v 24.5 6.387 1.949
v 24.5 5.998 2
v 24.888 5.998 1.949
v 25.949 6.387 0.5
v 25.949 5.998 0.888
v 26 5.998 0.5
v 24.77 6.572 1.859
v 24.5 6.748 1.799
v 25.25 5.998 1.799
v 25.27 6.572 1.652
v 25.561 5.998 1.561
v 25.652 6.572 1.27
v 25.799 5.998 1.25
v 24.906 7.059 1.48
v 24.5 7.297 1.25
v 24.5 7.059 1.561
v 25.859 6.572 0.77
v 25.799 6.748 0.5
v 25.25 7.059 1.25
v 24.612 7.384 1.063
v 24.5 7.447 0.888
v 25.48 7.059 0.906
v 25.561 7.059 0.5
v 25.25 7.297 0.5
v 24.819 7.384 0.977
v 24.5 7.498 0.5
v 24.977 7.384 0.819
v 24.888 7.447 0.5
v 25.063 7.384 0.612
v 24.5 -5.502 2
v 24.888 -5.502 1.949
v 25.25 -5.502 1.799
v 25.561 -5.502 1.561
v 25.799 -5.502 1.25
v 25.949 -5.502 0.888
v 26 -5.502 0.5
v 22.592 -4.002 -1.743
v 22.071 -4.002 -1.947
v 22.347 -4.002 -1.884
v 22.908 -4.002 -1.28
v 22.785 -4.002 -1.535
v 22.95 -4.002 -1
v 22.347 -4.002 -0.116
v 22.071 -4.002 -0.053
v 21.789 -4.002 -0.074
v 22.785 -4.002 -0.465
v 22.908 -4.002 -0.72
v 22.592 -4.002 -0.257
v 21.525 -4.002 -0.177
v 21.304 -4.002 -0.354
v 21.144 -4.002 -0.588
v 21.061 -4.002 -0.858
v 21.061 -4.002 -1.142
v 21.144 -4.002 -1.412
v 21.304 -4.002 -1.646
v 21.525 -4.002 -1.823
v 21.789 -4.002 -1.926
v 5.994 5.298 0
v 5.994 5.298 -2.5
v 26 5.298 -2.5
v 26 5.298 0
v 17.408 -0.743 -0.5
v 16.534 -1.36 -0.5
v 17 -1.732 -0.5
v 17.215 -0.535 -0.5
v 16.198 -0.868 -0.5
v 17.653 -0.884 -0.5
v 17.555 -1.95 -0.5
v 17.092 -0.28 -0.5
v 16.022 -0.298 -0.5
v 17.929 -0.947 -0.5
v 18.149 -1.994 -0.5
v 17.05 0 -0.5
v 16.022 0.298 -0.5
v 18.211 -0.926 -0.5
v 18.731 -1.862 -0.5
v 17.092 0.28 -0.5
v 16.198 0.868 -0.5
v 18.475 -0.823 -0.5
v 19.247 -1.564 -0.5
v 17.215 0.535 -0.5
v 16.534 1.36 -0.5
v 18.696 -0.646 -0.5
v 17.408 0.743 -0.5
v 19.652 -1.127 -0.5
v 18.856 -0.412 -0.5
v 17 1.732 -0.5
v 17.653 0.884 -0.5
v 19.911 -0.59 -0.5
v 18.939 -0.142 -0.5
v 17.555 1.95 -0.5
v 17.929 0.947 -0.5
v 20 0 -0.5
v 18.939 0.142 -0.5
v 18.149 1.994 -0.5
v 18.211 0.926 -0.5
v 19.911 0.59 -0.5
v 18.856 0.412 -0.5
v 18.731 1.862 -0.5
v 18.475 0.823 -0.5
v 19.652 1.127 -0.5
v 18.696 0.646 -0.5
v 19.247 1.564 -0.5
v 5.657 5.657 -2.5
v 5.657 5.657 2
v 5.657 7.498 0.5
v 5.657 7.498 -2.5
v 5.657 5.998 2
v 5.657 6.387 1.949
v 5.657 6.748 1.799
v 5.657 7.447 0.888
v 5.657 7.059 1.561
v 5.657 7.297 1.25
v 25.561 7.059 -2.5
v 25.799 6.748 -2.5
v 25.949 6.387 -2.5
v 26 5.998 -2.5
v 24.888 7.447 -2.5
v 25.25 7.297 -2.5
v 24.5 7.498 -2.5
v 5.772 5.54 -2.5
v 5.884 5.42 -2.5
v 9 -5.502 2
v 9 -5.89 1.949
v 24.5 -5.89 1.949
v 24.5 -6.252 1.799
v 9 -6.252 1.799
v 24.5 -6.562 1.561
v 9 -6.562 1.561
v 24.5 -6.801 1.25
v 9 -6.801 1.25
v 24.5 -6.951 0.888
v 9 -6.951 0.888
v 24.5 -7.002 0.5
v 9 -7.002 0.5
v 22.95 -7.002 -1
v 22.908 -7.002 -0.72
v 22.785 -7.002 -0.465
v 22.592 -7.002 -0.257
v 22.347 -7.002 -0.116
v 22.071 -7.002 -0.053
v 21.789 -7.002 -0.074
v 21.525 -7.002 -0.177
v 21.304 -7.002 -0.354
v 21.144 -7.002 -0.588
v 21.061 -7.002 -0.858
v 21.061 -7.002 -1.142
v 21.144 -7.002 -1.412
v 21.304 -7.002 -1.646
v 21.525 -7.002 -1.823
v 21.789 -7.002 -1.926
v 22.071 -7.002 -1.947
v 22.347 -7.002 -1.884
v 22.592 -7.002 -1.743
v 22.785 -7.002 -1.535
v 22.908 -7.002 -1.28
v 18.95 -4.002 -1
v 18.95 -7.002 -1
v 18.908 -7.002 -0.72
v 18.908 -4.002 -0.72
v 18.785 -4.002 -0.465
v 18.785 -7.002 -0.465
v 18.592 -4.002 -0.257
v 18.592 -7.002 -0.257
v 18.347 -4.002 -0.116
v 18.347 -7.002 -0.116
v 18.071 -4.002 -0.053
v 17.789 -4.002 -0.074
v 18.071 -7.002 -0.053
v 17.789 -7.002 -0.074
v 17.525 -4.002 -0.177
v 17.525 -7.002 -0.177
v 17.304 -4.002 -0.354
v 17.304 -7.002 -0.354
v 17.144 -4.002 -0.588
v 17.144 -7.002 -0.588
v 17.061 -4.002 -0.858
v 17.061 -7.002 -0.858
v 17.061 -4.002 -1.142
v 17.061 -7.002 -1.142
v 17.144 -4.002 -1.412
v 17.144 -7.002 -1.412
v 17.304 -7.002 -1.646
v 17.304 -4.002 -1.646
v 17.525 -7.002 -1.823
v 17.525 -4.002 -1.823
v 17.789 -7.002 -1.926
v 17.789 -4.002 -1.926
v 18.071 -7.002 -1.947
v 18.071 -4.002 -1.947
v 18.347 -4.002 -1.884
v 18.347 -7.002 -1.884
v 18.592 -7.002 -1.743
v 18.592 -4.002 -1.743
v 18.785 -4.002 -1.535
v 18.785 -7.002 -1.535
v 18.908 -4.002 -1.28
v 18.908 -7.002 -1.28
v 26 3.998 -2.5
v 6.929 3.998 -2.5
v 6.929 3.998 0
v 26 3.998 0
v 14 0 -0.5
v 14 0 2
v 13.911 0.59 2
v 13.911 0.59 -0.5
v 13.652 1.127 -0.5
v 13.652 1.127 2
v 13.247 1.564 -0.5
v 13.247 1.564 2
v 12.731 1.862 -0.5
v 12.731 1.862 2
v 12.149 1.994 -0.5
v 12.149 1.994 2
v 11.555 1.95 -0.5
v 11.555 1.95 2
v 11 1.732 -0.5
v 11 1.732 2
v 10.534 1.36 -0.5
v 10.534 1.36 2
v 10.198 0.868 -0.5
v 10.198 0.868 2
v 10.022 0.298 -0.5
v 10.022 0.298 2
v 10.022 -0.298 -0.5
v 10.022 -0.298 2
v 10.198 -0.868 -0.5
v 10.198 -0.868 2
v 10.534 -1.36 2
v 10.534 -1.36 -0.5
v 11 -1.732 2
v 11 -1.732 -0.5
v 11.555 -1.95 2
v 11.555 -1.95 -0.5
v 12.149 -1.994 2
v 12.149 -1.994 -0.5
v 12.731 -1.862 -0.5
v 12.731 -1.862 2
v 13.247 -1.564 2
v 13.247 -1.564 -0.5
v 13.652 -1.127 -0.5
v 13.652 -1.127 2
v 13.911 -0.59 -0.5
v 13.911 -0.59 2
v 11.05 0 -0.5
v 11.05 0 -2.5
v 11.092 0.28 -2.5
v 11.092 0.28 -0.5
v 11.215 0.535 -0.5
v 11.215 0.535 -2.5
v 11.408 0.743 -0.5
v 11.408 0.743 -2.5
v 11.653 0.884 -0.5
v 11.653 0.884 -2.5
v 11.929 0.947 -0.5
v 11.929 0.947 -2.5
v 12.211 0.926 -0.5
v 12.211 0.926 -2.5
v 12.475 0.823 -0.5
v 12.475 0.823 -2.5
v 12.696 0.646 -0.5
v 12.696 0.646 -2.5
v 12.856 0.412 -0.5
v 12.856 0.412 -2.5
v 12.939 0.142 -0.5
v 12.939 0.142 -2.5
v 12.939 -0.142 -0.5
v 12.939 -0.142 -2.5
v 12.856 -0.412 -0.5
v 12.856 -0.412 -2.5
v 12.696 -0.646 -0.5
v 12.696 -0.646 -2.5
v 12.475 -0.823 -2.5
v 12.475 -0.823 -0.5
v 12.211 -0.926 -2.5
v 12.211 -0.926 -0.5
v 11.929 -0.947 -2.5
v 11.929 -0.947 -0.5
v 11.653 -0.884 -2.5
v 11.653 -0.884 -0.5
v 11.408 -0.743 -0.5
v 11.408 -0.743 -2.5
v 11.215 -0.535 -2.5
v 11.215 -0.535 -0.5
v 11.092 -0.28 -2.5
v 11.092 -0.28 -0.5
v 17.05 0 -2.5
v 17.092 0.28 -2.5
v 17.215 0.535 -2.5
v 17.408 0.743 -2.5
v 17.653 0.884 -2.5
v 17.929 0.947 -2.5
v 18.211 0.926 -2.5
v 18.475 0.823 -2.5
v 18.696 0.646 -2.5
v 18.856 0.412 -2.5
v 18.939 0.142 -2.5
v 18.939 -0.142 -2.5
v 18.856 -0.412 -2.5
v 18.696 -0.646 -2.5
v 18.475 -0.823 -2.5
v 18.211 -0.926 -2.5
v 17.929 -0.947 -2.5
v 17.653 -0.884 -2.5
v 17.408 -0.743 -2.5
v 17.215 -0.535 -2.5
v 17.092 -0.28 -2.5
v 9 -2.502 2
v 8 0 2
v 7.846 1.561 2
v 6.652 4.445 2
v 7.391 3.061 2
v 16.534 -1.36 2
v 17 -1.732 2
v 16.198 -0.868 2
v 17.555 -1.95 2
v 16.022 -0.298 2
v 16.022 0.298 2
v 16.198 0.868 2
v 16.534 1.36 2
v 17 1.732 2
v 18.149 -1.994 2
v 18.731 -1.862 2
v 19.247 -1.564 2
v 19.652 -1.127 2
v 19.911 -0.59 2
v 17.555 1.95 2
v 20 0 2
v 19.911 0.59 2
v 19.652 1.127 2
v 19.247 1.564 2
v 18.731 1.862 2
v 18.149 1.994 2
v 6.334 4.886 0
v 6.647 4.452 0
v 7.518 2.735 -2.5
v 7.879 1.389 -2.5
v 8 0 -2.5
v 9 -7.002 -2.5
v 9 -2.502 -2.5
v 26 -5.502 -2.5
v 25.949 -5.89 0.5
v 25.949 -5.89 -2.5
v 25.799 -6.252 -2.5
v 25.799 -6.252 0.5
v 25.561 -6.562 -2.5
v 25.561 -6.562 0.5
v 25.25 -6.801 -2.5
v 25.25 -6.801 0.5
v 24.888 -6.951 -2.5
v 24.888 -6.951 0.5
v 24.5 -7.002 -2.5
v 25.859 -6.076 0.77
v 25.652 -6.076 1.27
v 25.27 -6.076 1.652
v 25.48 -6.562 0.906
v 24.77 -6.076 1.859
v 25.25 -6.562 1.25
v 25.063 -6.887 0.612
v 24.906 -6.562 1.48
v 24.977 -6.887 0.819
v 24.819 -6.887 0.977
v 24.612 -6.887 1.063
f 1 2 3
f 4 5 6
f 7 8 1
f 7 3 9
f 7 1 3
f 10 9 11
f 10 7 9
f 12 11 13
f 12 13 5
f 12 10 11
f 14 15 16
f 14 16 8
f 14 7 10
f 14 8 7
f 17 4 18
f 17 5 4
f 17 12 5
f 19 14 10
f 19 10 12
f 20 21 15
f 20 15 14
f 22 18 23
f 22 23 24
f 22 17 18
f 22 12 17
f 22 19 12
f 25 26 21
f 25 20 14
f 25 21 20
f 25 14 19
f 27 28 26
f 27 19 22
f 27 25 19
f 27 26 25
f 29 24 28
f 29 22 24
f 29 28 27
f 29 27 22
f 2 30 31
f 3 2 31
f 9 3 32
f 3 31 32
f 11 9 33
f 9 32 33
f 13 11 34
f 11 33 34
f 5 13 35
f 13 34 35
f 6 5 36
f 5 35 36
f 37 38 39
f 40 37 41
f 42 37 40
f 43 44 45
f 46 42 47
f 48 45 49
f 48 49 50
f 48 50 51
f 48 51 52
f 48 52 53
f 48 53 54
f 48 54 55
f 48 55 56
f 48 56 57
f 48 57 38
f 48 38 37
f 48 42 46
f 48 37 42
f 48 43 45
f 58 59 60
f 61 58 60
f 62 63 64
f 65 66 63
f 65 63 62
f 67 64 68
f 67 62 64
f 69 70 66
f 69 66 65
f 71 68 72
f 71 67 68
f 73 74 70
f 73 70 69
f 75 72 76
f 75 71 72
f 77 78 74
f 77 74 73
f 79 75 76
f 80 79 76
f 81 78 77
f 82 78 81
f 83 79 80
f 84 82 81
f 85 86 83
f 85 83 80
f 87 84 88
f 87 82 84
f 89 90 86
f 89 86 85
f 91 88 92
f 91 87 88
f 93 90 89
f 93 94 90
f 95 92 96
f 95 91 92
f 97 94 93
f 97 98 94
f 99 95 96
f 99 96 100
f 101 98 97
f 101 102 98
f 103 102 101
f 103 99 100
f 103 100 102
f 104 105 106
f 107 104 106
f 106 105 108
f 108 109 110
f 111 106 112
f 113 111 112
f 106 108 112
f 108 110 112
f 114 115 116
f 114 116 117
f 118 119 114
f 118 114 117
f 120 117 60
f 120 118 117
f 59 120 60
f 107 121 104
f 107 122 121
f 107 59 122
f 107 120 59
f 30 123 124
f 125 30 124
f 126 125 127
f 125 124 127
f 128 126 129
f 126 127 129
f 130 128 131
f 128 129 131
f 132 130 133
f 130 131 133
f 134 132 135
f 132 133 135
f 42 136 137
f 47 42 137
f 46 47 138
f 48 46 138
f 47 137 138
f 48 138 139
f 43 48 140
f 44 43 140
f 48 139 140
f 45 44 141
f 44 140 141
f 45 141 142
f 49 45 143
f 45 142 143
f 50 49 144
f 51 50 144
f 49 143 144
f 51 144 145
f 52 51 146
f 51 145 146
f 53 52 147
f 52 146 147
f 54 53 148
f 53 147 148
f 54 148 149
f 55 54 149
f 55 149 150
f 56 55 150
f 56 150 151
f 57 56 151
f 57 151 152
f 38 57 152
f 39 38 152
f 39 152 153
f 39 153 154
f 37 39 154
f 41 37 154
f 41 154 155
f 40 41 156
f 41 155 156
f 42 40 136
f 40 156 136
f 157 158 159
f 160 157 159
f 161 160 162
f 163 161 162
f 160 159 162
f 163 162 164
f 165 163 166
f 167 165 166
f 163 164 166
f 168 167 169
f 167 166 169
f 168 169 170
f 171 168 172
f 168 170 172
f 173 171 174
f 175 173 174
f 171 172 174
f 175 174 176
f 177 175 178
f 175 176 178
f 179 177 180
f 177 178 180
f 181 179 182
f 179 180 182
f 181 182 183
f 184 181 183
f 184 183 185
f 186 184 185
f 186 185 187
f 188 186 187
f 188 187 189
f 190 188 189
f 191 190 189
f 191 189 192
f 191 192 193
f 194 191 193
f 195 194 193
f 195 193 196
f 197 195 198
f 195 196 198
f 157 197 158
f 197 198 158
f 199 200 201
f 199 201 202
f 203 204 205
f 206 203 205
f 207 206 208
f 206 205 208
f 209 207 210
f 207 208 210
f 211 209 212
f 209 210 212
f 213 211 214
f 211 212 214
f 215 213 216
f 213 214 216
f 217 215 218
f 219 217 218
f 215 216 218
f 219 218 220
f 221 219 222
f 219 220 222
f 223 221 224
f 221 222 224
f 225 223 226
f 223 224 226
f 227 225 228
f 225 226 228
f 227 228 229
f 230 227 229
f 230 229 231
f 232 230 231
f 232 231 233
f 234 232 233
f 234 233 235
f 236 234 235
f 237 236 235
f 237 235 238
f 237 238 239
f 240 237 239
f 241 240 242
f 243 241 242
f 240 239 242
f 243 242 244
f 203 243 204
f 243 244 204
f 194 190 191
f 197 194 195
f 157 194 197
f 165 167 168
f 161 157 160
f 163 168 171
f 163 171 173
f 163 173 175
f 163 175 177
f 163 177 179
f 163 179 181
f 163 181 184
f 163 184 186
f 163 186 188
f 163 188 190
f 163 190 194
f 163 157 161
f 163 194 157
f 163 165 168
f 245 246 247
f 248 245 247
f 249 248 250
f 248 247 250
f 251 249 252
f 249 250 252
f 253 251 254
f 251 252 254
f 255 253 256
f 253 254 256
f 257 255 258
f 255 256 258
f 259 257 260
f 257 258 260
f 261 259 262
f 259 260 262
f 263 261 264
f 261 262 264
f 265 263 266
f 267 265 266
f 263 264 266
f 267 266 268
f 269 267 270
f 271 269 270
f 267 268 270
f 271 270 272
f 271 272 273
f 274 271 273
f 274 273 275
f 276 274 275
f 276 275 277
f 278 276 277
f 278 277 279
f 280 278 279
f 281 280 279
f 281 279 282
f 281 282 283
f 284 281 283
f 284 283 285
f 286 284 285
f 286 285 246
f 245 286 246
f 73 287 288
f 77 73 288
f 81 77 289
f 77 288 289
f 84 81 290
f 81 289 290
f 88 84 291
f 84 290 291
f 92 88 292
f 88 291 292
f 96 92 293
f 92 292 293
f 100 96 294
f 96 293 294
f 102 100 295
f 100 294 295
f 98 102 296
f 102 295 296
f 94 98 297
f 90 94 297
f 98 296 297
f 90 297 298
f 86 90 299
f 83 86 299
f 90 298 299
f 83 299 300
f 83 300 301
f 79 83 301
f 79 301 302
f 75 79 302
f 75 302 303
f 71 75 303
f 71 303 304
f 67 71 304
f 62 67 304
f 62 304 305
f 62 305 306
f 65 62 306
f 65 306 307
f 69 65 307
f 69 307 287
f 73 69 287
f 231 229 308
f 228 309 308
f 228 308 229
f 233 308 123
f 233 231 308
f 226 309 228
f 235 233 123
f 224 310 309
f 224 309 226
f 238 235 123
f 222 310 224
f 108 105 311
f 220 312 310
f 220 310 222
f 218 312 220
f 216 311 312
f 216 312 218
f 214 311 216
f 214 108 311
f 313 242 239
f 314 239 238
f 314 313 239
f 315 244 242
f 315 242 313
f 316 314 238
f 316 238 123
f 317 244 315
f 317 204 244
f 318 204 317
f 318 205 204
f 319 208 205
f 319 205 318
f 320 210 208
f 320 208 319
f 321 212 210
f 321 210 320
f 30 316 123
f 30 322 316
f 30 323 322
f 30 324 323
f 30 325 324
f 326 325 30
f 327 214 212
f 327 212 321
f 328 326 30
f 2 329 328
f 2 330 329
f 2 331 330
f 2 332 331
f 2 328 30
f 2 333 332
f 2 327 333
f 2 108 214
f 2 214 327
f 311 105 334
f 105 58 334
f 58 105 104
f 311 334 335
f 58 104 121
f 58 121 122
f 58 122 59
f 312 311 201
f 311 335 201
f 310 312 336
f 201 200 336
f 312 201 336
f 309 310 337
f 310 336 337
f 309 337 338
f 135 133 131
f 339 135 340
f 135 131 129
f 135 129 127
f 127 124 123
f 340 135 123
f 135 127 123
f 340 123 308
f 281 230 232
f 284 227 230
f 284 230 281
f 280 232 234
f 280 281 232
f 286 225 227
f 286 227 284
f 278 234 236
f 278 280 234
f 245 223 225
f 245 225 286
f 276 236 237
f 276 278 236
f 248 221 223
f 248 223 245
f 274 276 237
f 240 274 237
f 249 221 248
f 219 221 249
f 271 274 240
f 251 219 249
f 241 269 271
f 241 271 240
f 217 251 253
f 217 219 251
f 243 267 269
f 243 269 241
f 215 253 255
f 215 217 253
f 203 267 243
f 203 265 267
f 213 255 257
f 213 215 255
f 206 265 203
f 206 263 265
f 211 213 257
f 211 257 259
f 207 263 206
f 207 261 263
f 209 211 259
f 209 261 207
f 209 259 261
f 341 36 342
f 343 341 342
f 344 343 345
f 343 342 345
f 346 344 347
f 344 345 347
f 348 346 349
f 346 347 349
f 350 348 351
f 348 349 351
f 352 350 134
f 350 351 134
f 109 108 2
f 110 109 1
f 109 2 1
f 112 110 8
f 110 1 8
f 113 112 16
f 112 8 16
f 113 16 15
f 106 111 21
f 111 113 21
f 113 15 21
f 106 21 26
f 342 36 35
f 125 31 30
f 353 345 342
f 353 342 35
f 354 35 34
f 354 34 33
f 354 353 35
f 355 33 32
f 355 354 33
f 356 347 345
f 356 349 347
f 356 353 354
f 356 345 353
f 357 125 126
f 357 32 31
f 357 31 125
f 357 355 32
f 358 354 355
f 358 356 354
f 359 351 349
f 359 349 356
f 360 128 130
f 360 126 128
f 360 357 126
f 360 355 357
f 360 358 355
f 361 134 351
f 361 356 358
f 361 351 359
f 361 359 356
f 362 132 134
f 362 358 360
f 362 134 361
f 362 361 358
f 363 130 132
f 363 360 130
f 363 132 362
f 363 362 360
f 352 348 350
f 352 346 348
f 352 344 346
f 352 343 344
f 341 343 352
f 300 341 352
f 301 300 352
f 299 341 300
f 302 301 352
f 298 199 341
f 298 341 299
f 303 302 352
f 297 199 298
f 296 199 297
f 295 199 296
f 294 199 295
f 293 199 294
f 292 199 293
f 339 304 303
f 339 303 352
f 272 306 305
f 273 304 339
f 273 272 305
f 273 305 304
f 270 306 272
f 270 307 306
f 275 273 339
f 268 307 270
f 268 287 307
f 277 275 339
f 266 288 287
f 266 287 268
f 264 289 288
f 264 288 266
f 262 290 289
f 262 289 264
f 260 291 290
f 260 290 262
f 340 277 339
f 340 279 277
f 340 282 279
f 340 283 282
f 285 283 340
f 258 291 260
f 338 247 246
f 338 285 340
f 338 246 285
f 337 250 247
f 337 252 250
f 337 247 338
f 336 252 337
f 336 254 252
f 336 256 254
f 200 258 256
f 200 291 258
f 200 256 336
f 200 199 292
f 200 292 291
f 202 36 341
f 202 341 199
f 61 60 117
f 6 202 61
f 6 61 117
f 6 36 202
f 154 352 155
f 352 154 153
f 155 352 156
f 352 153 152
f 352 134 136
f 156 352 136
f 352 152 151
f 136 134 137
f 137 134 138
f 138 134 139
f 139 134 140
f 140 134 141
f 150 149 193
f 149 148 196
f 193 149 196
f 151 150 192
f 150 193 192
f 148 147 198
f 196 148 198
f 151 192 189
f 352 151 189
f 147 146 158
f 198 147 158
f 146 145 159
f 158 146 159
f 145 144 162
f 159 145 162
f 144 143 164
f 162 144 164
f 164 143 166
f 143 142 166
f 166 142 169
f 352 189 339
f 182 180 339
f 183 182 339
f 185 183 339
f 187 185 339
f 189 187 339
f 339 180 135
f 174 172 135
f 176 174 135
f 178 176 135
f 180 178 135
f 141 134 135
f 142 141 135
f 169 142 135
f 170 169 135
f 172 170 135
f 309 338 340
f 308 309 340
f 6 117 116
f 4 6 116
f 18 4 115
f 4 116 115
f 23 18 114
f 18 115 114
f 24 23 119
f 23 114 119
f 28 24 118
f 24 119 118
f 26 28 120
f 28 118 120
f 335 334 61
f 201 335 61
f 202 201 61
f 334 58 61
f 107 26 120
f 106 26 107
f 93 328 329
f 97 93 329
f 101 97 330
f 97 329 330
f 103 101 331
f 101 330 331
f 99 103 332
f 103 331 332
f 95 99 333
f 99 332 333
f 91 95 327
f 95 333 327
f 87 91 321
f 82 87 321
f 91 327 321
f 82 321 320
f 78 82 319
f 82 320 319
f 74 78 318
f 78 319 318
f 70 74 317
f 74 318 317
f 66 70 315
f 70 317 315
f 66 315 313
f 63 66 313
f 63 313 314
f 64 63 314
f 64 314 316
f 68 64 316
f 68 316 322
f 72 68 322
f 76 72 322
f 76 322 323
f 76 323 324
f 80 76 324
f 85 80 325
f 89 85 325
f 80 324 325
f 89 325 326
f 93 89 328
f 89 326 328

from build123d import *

# Parameters (mm, degrees)
BOSS_EXTRUDE1_DEPTH = 2
BOSS_EXTRUDE2_START = 2.5
BOSS_EXTRUDE2_DEPTH = 2.5
CUT_EXTRUDE1_DEPTH  = 2.5
BOSS_EXTRUDE3_DEPTH = 2.3
SKETCH9_R           = 2.1
CUT_EXTRUDE2_DEPTH  = 2.5
SKETCH10_R          = 2.5
BOSS_EXTRUDE4_DEPTH = 1.2
SKETCH11_R          = 0.95
CUT_EXTRUDE3_DEPTH  = 9.2
SKETCH12_R          = 2
CUT_EXTRUDE4_DEPTH  = 2.5
SKETCH14_W          = 20.343145751
SKETCH14_H          = 1.841510486
SKETCH14_W_2        = 17
SKETCH14_H_2        = 1.34163614
BOSS_EXTRUDE5_DEPTH = 1.2
FILLET1_R           = 1.5
SKETCH17_R          = 0.95
CUT_EXTRUDE5_DEPTH  = 3


# Read off the part's stored shape, not the designer's step: Boss-Extrude3
with BuildPart() as part:
    # Sketch5 → Boss-Extrude1 (new body)
    with BuildSketch(Plane.XY):
        with BuildLine():
            Line((8, 0), (9, -2.501635265))
            Line((9, -2.501635265), (9, -7.001635265))
            Line((9, -7.001635265), (26, -7.001635265))
            Line((26, -7.001635265), (26, 7.498364735))
            Line((26, 7.498364735), (5.656854249, 7.498364735))
            Line((5.656854249, 7.498364735), (5.656854249, 5.656854249))
            ThreePointArc((5.656854249, 5.656854249), (7.39103626, 3.061467459), (8, 0))
        make_face()
    extrude(amount=BOSS_EXTRUDE1_DEPTH)

    # Sketch6 → Boss-Extrude2 (add)
    with BuildSketch(Plane(origin=(0, 0, 0), x_dir=(-1, 0, 0), z_dir=(0, 0, -1)).offset(BOSS_EXTRUDE2_START)):
        with BuildLine():
            Line((-5.656854249, 7.498364735), (-5.656854249, 5.656854249))
            ThreePointArc((-5.656854249, 5.656854249), (-7.39103626, 3.061467459), (-8, 0))
            Line((-8, 0), (-9, -2.501635265))
            Line((-9, -2.501635265), (-9, -7.001635265))
            Line((-9, -7.001635265), (-26, -7.001635265))
            Line((-26, -7.001635265), (-26, 7.498364735))
            Line((-26, 7.498364735), (-5.656854249, 7.498364735))
        make_face()
    extrude(amount=-BOSS_EXTRUDE2_DEPTH)

    # Sketch7 → Cut-Extrude1 (cut)
    with BuildSketch(Plane(origin=(0, 0, -2.5), x_dir=(-1, 0, 0), z_dir=(0, 0, -1))):
        Polygon((-26, 5.298364735), (-2.738141148, 5.298364735), (-2.738141148, 3.998364735), (-29.849535112, 3.998364735), (-29.849535112, 5.298364735), align=None)
    extrude(amount=-CUT_EXTRUDE1_DEPTH, mode=Mode.SUBTRACT)

    # Boss-Extrude3 outline → Boss-Extrude3 (add)
    with BuildSketch(Plane(origin=(0, 0, -2.5), x_dir=(-1, 0, 0), z_dir=(0, 0, -1))):
        with BuildLine():
            Line((-9, -7.001635265), (-9, -5.659999125))
            Line((-9, -5.659999125), (0, -5.659998688))
            ThreePointArc((0, -5.659998688), (5.659998688, 0), (0, 5.659998688))
            Line((0, 5.659998688), (-5.656854249, 5.656854249))
            Line((-5.656854249, 5.656854249), (-5.656854249, 7.498364735))
            Line((-5.656854249, 7.498364735), (-26, 7.498364735))
            Line((-26, 7.498364735), (-26, -7.001635265))
            Line((-26, -7.001635265), (-9, -7.001635265))
        make_face()
    extrude(amount=BOSS_EXTRUDE3_DEPTH)

    # Sketch9 → Cut-Extrude2 (cut)
    with BuildSketch(Plane(origin=(0, 0, -4.8), x_dir=(-1, 0, 0), z_dir=(0, 0, -1))):
        Circle(SKETCH9_R)
    extrude(amount=-CUT_EXTRUDE2_DEPTH, mode=Mode.SUBTRACT)

    # Sketch10 → Boss-Extrude4 (add)
    with BuildSketch(Plane(origin=(0, 0, -4.8), x_dir=(-1, 0, 0), z_dir=(0, 0, -1))):
        with Locations((-12, 0)):
            Circle(SKETCH10_R)
        with Locations((-18, 0)):
            Circle(SKETCH10_R)
    extrude(amount=BOSS_EXTRUDE4_DEPTH)

    # Sketch11 → Cut-Extrude3 (cut)
    with BuildSketch(Plane(origin=(0, 0, -6), x_dir=(-1, 0, 0), z_dir=(0, 0, -1))):
        with Locations((-18, 0)):
            Circle(SKETCH11_R)
        with Locations((-12, 0)):
            Circle(SKETCH11_R)
    extrude(amount=-CUT_EXTRUDE3_DEPTH, mode=Mode.SUBTRACT)

    # Sketch12 → Cut-Extrude4 (cut)
    with BuildSketch(Plane.XY.offset(2)):
        with Locations((12, 0)):
            Circle(SKETCH12_R)
        with Locations((18, 0)):
            Circle(SKETCH12_R)
    extrude(amount=-CUT_EXTRUDE4_DEPTH, mode=Mode.SUBTRACT)

    # Sketch14 → Boss-Extrude5 (add)
    with BuildSketch(Plane(origin=(0, 0, -4.8), x_dir=(-1, 0, 0), z_dir=(0, 0, -1))):
        with Locations((-15.828427124, 6.577609492)):
            Rectangle(SKETCH14_W, SKETCH14_H)
        with Locations((-17.5, -6.330817195)):
            Rectangle(SKETCH14_W_2, SKETCH14_H_2)
    extrude(amount=BOSS_EXTRUDE5_DEPTH)

    # Fillet1
    # the kernel refuses this fillet: 1.5 mm, written as the material it takes off along each edge
    with BuildSketch(Plane(origin=(24.5, -5.501635265, 0.5), x_dir=(0, 0, 1), z_dir=(0, -1, 0))) as fillet1_piece_1_section:
        Polygon((0, 0), (FILLET1_R, 0), (FILLET1_R, -FILLET1_R), (0, -FILLET1_R), align=None)
    fillet1_piece_1 = extrude(amount=FILLET1_R, mode=Mode.PRIVATE)
    fillet1_piece_1 = fillet1_piece_1 - Plane(origin=(24.5, -5.501635265, 0.5), x_dir=(-0.7071067811865475, 0, -0.7071067811865475), z_dir=(0, -1, 0)) * Sphere(FILLET1_R, mode=Mode.PRIVATE)
    add(fillet1_piece_1, mode=Mode.SUBTRACT)
    with BuildSketch(Plane(origin=(24.5, 5.998364735, 0.5), x_dir=(0, 0, 1), z_dir=(0, 1, 0))) as fillet1_piece_2_section:
        Polygon((0, 0), (FILLET1_R, 0), (FILLET1_R, FILLET1_R), (0, FILLET1_R), align=None)
    fillet1_piece_2 = extrude(amount=FILLET1_R, mode=Mode.PRIVATE)
    fillet1_piece_2 = fillet1_piece_2 - Plane(origin=(24.5, 5.998364735, 0.5), x_dir=(-0.7071067811865475, 0, -0.7071067811865475), z_dir=(0, 1, 0)) * Sphere(FILLET1_R, mode=Mode.PRIVATE)
    add(fillet1_piece_2, mode=Mode.SUBTRACT)
    with BuildSketch(Plane(origin=(26, -5.501635265, 2), x_dir=(-1, 0, 0), z_dir=(0, 1, 0))) as fillet1_piece_3:
        with BuildLine():
            CenterArc((FILLET1_R, -FILLET1_R), FILLET1_R, 90, 90)
            Line((0, -FILLET1_R), (0, 0))
            Line((0, 0), (FILLET1_R, 0))
        make_face()
    extrude(amount=11.5, mode=Mode.SUBTRACT)
    with BuildSketch(Plane(origin=(26, -7.001635265, -2.5), x_dir=(-1, 0, 0), z_dir=(0, 0, 1))) as fillet1_piece_4:
        with BuildLine():
            CenterArc((FILLET1_R, -FILLET1_R), FILLET1_R, 90, 90)
            Line((0, -FILLET1_R), (0, 0))
            Line((0, 0), (FILLET1_R, 0))
        make_face()
    extrude(amount=3, mode=Mode.SUBTRACT)
    with BuildSketch(Plane(origin=(5.25, -7.001635265, 2), x_dir=(0, 1, 0), z_dir=(1, 0, 0))) as fillet1_piece_5:
        with BuildLine():
            CenterArc((FILLET1_R, -FILLET1_R), FILLET1_R, 90, 90)
            Line((0, -FILLET1_R), (0, 0))
            Line((0, 0), (FILLET1_R, 0))
        make_face()
    extrude(amount=19.25, mode=Mode.SUBTRACT)
    with BuildSketch(Plane(origin=(24.5, 7.498364735, 2), x_dir=(0, -1, 0), z_dir=(-1, 0, 0))) as fillet1_piece_6:
        with BuildLine():
            CenterArc((FILLET1_R, -FILLET1_R), FILLET1_R, 90, 90)
            Line((0, -FILLET1_R), (0, 0))
            Line((0, 0), (FILLET1_R, 0))
        make_face()
    extrude(amount=22.593145751, mode=Mode.SUBTRACT)
    with BuildSketch(Plane(origin=(26, 7.498364735, -2.5), x_dir=(-1, 0, 0), z_dir=(0, 0, 1))) as fillet1_piece_7:
        with BuildLine():
            CenterArc((FILLET1_R, FILLET1_R), FILLET1_R, 180, 90)
            Line((0, FILLET1_R), (0, 0))
            Line((0, 0), (FILLET1_R, 0))
        make_face()
    extrude(amount=3, mode=Mode.SUBTRACT)
    with BuildSketch(Plane(origin=(26, 7.498364735, -2.5), x_dir=(-1.0, -1.9174232572065026e-10, 0), z_dir=(0, 0, -1))) as fillet1_piece_8:
        with BuildLine():
            CenterArc((FILLET1_R, -FILLET1_R), FILLET1_R, 90.000000011, 90)
            Line((FILLET1_R * 1.9173522033e-10, -FILLET1_R), (0, 0))
            Line((0, 0), (FILLET1_R, 0))
        make_face()
    extrude(amount=2.3, mode=Mode.SUBTRACT)
    with BuildSketch(Plane(origin=(26, 7.498364735, -4.8), x_dir=(-1, 0, 0), z_dir=(0, 0, -1))) as fillet1_piece_9:
        with BuildLine():
            CenterArc((FILLET1_R, -FILLET1_R), FILLET1_R, 90, 90)
            Line((0, -FILLET1_R), (0, 0))
            Line((0, 0), (FILLET1_R, 0))
        make_face()
    extrude(amount=4.95, mode=Mode.SUBTRACT)
    with BuildSketch(Plane(origin=(26, -7.001635265, -2.5), x_dir=(-1.0, -1.9169850891861218e-10, 0), z_dir=(0, 0, -1))) as fillet1_piece_10:
        with BuildLine():
            CenterArc((FILLET1_R, FILLET1_R), FILLET1_R, 180.000000011, 90)
            Line((-FILLET1_R * 1.91707982785e-10, FILLET1_R), (0, 0))
            Line((0, 0), (FILLET1_R, 0))
        make_face()
    extrude(amount=2.3, mode=Mode.SUBTRACT)
    with BuildSketch(Plane(origin=(26, -7.001635265, -4.8), x_dir=(-1, 0, 0), z_dir=(0, 0, -1))) as fillet1_piece_11:
        with BuildLine():
            CenterArc((FILLET1_R, FILLET1_R), FILLET1_R, 180, 90)
            Line((0, FILLET1_R), (0, 0))
            Line((0, 0), (FILLET1_R, 0))
        make_face()
    extrude(amount=4.95, mode=Mode.SUBTRACT)

    # Sketch17 → Cut-Extrude5 (cut)
    with BuildSketch(Plane.XZ.offset(7.001635265)):
        with Locations((22, -1)):
            Circle(SKETCH17_R)
        with Locations((18, -1)):
            Circle(SKETCH17_R)
    extrude(amount=-CUT_EXTRUDE5_DEPTH, mode=Mode.SUBTRACT)


with BuildPart() as body_2:
    # Split1: the piece on the far side of the plane
    add(part.part)
    split(bisect_by=Plane(origin=(0, 0, -2.5), x_dir=(-1, 0, 0), z_dir=(0, 0, -1)), keep=Keep.BOTTOM)


with BuildPart() as part_1:
    add(part.part)

    # Split1
    split(bisect_by=Plane(origin=(0, 0, -2.5), x_dir=(-1, 0, 0), z_dir=(0, 0, -1)), keep=Keep.TOP)


solid = body_2.part
